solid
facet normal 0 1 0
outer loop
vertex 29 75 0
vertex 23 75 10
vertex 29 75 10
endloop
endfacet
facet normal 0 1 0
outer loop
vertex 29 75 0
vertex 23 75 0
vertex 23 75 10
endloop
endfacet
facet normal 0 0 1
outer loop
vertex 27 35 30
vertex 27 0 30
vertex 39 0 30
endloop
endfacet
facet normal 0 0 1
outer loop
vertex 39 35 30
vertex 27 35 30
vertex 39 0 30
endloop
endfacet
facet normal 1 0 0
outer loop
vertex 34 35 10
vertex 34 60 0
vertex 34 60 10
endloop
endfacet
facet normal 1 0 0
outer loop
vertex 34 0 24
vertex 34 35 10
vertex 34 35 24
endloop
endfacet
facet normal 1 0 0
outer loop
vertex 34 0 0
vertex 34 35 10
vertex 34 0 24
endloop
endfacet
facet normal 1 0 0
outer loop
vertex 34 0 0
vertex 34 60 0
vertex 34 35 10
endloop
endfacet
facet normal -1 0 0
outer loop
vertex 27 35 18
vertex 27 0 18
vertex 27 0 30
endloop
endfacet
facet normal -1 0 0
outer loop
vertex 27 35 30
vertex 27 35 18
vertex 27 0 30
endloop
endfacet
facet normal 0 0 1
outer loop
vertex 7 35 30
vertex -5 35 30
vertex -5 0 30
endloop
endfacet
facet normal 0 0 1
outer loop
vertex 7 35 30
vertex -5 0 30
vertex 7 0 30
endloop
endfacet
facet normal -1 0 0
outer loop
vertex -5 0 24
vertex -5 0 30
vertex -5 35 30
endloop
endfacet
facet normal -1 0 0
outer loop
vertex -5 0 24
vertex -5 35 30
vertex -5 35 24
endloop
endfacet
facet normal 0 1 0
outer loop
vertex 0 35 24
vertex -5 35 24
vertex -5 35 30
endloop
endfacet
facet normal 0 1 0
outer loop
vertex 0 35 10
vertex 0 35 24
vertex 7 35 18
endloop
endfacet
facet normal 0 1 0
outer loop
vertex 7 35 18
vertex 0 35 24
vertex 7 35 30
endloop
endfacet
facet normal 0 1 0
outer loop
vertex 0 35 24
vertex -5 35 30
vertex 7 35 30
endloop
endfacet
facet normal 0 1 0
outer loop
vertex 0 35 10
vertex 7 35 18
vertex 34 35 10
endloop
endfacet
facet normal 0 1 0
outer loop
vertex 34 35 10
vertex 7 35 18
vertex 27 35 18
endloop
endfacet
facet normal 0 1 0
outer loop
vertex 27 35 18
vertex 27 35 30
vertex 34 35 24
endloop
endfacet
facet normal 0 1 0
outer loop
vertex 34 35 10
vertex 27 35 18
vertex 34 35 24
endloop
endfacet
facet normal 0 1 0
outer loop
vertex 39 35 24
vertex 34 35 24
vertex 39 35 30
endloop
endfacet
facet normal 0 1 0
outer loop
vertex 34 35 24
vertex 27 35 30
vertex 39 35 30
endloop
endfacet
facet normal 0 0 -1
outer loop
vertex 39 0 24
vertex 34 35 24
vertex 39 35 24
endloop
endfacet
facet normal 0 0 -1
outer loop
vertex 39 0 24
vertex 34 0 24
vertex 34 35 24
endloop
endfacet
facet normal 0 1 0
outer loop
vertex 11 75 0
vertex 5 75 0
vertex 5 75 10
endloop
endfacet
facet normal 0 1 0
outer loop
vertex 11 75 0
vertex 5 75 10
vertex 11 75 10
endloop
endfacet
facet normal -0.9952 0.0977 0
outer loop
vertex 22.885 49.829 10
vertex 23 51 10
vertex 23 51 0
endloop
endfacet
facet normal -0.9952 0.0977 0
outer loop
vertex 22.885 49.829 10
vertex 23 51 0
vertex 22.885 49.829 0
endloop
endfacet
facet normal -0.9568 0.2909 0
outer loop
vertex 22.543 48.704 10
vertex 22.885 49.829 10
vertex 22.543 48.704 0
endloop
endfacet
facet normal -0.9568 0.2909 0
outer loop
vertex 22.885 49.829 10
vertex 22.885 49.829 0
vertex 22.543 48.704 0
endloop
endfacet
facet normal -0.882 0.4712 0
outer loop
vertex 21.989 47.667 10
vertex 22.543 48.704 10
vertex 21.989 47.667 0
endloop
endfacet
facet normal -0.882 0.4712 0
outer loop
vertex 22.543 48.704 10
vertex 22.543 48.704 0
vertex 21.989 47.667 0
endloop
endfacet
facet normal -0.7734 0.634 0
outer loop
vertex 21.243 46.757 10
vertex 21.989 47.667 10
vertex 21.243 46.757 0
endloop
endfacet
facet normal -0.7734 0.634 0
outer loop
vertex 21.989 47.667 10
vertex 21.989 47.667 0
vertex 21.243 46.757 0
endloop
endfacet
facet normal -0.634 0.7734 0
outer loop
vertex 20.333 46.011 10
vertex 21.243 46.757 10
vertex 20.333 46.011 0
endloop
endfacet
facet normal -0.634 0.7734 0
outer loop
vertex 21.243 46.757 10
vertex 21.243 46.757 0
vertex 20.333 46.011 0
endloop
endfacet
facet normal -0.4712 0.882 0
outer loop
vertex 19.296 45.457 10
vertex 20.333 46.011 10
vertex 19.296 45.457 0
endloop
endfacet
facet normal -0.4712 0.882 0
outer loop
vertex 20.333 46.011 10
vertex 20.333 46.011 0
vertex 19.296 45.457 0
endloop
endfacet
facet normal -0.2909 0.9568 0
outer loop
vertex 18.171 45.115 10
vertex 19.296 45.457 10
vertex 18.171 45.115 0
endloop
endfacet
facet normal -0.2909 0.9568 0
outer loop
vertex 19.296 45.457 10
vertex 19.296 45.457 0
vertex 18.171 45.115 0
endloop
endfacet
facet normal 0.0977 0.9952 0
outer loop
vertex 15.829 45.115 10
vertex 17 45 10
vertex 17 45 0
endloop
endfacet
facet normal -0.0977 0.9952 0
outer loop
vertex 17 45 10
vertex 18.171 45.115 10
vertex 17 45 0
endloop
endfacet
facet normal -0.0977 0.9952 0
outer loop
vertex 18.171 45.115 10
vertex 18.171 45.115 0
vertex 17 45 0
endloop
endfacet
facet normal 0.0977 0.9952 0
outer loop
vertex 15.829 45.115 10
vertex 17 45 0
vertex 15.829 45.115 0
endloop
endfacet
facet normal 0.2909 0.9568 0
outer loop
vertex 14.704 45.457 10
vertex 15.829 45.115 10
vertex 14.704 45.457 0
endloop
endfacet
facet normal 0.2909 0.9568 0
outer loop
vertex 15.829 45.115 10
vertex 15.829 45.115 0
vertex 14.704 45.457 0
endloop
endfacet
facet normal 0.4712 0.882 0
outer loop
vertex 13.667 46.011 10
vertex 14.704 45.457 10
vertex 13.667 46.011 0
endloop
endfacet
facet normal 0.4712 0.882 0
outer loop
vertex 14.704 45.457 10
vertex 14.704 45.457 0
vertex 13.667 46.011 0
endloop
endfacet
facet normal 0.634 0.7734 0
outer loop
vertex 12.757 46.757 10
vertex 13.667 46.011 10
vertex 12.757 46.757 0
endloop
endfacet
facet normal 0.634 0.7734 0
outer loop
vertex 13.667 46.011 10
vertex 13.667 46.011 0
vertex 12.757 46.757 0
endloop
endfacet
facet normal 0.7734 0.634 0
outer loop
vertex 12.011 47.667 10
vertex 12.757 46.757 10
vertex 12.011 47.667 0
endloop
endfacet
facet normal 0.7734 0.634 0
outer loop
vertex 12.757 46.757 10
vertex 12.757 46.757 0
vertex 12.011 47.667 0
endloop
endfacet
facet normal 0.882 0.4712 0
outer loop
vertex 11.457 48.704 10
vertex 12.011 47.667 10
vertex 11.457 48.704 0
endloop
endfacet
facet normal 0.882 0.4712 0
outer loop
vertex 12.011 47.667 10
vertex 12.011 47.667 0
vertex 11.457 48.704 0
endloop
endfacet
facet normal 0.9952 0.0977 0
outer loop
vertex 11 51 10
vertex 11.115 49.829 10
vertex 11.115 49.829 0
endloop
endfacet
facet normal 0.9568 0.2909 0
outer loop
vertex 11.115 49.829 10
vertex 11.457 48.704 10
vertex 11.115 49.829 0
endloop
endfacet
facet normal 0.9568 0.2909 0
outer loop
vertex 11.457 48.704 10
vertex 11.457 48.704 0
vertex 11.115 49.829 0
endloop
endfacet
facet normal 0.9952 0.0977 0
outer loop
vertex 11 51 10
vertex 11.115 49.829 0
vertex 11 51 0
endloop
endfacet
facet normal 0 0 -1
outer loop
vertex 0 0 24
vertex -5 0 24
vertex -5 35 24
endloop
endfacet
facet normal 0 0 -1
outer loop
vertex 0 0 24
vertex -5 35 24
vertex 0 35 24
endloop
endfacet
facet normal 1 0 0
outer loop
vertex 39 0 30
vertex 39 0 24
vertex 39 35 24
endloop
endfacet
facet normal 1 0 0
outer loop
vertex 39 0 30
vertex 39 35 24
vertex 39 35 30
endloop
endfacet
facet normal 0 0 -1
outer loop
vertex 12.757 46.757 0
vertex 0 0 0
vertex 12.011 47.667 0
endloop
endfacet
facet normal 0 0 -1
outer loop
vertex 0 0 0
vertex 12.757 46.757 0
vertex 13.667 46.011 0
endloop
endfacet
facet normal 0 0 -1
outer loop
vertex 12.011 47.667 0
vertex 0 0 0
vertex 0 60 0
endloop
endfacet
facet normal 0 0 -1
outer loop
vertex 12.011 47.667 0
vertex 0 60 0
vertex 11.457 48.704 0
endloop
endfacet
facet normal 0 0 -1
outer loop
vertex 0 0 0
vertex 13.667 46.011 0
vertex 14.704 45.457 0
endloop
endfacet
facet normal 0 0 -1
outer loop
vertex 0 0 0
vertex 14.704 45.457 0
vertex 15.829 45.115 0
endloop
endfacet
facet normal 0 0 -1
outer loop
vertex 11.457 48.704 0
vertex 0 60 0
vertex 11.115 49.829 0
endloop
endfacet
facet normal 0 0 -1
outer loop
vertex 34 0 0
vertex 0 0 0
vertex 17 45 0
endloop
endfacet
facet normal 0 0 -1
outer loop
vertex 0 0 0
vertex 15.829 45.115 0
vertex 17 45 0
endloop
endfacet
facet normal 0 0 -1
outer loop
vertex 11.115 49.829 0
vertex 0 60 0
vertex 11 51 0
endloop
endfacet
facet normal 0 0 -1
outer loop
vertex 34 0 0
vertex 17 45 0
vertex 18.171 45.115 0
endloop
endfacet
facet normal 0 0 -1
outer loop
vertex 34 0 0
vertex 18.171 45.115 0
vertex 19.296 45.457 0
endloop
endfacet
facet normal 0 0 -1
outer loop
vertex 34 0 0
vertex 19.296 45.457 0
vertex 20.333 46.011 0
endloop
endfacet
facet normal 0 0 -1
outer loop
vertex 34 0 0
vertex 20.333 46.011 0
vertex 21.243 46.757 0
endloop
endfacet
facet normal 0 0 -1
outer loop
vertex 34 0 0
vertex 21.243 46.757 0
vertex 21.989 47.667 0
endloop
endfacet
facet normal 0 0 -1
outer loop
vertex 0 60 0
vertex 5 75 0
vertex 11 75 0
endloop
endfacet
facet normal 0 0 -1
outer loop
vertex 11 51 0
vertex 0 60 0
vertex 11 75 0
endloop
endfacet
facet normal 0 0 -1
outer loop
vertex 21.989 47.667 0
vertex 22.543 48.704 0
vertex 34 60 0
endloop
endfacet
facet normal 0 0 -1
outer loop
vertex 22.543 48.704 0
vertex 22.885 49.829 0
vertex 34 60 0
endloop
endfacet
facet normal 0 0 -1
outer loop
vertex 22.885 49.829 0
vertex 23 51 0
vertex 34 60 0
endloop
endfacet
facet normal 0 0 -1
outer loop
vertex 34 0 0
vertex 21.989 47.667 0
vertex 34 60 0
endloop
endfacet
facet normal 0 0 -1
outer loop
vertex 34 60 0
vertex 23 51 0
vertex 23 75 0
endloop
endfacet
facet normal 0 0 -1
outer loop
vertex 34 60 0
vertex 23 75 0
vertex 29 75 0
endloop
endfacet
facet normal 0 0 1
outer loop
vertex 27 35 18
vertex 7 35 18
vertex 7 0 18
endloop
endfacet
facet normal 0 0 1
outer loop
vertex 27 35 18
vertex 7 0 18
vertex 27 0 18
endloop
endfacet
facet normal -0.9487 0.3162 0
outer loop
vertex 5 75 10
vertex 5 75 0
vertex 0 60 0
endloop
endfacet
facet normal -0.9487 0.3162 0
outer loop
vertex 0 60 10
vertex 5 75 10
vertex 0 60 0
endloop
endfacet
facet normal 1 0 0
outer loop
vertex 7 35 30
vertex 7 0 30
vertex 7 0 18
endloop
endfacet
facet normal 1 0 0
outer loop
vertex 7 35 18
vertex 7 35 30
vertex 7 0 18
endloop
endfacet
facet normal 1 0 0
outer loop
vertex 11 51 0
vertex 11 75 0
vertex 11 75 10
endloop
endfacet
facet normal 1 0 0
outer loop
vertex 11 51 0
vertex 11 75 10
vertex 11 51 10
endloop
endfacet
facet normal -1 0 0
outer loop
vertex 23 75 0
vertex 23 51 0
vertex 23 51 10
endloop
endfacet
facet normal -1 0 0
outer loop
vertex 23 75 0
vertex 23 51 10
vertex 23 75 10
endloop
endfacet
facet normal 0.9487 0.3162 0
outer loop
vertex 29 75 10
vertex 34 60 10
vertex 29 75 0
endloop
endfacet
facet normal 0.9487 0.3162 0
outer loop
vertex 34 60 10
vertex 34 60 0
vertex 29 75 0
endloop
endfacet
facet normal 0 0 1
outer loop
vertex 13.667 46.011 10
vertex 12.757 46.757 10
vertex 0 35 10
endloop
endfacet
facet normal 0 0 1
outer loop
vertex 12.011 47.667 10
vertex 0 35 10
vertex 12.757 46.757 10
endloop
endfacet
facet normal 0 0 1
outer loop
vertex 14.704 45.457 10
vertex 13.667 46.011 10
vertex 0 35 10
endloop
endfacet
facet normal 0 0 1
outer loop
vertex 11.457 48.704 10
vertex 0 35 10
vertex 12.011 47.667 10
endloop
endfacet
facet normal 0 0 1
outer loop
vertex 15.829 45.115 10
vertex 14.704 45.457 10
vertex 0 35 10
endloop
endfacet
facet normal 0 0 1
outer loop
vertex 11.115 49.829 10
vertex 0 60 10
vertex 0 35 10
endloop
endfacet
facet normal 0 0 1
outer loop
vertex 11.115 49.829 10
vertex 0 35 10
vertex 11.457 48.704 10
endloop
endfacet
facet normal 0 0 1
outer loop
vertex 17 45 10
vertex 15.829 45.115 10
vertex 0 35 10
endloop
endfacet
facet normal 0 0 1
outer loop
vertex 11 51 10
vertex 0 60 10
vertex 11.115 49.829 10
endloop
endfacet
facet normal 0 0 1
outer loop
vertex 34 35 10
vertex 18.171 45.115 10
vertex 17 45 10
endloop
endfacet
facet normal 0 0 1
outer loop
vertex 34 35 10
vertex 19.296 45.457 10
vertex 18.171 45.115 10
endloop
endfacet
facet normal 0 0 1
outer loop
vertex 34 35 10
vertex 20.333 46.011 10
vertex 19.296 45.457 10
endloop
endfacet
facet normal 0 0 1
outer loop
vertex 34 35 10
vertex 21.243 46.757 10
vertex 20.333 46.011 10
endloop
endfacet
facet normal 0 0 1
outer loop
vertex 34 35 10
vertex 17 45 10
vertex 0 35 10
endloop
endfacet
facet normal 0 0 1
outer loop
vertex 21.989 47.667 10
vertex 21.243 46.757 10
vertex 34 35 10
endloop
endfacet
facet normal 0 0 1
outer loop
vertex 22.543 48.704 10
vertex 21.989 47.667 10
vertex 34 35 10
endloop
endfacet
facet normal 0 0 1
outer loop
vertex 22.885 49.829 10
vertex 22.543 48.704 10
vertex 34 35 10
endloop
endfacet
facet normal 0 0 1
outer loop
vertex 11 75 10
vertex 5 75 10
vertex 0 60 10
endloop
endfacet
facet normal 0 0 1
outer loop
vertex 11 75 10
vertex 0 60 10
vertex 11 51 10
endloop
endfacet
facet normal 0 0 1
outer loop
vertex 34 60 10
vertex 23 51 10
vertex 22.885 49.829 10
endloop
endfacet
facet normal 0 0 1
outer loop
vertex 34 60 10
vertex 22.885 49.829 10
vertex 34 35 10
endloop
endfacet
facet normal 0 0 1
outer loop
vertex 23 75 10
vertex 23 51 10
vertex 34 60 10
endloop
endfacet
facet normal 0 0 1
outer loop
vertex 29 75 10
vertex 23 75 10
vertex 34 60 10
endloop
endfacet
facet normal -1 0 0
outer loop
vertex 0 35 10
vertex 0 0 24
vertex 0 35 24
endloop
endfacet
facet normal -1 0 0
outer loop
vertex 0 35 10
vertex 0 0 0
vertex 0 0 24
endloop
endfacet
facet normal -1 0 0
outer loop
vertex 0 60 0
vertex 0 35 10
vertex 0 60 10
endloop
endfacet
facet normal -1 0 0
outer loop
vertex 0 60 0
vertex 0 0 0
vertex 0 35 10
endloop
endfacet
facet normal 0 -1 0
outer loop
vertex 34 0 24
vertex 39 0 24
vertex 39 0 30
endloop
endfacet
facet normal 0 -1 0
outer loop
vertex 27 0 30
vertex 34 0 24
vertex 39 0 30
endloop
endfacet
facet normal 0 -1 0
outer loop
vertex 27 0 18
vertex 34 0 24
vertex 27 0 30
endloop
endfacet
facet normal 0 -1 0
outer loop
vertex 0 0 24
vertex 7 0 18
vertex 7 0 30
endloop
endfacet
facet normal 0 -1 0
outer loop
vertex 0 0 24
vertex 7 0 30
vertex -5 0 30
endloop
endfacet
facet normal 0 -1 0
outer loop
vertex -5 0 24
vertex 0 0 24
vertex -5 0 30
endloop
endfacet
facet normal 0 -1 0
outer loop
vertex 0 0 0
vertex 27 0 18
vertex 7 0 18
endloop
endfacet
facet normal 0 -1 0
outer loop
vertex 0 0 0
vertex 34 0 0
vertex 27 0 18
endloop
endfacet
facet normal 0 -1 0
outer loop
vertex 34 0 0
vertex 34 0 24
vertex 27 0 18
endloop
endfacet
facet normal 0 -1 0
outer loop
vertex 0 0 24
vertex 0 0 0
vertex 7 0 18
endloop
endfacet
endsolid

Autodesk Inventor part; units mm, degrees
ref_plane "YZ Plane" through (0, 0, 0) normal (1, 0, 0) x (0, 1, 0)
ref_plane "XZ Plane" through (0, 0, 0) normal (0, 1, 0) x (-1, 0, 0)
ref_plane "XY Plane" through (0, 0, 0) normal (0, 0, 1) x (1, 0, 0)
sketch "Náčrt1" plane through (0, 0, 0) normal (0, 0, 1) x (1, 0, 0)
  line L0 (0, 0) -> (0, 60)
  line L1 (5, 75) -> (0, 60)
  line L2 (5, 75) -> (11, 75)
  line L3 (11, 75) -> (11, 51)
  arc A0 (11, 51) -> (23, 51) centre (17, 51) ccw
  line L4 (23, 51) -> (23, 75)
  line L5 (23, 75) -> (29, 75)
  line L6 (34, 60) -> (29, 75)
  line L7 (34, 60) -> (34, 0)
  line L8 (34, 0) -> (0, 0)
  dimension "d0" = 60
  dimension "d3" = 6
  dimension "d4" = 24
  dimension "d5" = 12
  dimension "d6" = 6
extrude "Vysunutí1" add sketch "Náčrt1" along normal blind 10
sketch "Náčrt2" plane through (0, 0, 0) normal (0, -1, 0) x (1, 0, 0)
  line L0 (5, 10) -> (0, 10) projected
  line L1 (34, 0) -> (34, 10) projected
  line L2 (0, 10) -> (34, 10)
  line L3 (34, 10) -> (34, 24)
  line L4 (34, 24) -> (39, 24)
  line L5 (39, 24) -> (39, 30)
  line L6 (-5, 30) -> (-5, 24)
  line L7 (-5, 24) -> (0, 24)
  line L8 (0, 24) -> (0, 10)
  line L9 (-5, 30) -> (7, 30)
  line L10 (7, 30) -> (7, 18)
  line L11 (7, 18) -> (27, 18)
  line L12 (27, 18) -> (27, 30)
  line L13 (27, 30) -> (39, 30)
  point P0 (0, 0)
  dimension "d11" = 14
  dimension "d12" = 5
  dimension "d13" = 6
  dimension "d14" = 44
  dimension "d15" = 6
  dimension "d16" = 12
  dimension "d17" = 12
  dimension "d18" = 20
extrude "Vysunutí2" add sketch "Náčrt2" against normal blind 35
properties part number "6"
